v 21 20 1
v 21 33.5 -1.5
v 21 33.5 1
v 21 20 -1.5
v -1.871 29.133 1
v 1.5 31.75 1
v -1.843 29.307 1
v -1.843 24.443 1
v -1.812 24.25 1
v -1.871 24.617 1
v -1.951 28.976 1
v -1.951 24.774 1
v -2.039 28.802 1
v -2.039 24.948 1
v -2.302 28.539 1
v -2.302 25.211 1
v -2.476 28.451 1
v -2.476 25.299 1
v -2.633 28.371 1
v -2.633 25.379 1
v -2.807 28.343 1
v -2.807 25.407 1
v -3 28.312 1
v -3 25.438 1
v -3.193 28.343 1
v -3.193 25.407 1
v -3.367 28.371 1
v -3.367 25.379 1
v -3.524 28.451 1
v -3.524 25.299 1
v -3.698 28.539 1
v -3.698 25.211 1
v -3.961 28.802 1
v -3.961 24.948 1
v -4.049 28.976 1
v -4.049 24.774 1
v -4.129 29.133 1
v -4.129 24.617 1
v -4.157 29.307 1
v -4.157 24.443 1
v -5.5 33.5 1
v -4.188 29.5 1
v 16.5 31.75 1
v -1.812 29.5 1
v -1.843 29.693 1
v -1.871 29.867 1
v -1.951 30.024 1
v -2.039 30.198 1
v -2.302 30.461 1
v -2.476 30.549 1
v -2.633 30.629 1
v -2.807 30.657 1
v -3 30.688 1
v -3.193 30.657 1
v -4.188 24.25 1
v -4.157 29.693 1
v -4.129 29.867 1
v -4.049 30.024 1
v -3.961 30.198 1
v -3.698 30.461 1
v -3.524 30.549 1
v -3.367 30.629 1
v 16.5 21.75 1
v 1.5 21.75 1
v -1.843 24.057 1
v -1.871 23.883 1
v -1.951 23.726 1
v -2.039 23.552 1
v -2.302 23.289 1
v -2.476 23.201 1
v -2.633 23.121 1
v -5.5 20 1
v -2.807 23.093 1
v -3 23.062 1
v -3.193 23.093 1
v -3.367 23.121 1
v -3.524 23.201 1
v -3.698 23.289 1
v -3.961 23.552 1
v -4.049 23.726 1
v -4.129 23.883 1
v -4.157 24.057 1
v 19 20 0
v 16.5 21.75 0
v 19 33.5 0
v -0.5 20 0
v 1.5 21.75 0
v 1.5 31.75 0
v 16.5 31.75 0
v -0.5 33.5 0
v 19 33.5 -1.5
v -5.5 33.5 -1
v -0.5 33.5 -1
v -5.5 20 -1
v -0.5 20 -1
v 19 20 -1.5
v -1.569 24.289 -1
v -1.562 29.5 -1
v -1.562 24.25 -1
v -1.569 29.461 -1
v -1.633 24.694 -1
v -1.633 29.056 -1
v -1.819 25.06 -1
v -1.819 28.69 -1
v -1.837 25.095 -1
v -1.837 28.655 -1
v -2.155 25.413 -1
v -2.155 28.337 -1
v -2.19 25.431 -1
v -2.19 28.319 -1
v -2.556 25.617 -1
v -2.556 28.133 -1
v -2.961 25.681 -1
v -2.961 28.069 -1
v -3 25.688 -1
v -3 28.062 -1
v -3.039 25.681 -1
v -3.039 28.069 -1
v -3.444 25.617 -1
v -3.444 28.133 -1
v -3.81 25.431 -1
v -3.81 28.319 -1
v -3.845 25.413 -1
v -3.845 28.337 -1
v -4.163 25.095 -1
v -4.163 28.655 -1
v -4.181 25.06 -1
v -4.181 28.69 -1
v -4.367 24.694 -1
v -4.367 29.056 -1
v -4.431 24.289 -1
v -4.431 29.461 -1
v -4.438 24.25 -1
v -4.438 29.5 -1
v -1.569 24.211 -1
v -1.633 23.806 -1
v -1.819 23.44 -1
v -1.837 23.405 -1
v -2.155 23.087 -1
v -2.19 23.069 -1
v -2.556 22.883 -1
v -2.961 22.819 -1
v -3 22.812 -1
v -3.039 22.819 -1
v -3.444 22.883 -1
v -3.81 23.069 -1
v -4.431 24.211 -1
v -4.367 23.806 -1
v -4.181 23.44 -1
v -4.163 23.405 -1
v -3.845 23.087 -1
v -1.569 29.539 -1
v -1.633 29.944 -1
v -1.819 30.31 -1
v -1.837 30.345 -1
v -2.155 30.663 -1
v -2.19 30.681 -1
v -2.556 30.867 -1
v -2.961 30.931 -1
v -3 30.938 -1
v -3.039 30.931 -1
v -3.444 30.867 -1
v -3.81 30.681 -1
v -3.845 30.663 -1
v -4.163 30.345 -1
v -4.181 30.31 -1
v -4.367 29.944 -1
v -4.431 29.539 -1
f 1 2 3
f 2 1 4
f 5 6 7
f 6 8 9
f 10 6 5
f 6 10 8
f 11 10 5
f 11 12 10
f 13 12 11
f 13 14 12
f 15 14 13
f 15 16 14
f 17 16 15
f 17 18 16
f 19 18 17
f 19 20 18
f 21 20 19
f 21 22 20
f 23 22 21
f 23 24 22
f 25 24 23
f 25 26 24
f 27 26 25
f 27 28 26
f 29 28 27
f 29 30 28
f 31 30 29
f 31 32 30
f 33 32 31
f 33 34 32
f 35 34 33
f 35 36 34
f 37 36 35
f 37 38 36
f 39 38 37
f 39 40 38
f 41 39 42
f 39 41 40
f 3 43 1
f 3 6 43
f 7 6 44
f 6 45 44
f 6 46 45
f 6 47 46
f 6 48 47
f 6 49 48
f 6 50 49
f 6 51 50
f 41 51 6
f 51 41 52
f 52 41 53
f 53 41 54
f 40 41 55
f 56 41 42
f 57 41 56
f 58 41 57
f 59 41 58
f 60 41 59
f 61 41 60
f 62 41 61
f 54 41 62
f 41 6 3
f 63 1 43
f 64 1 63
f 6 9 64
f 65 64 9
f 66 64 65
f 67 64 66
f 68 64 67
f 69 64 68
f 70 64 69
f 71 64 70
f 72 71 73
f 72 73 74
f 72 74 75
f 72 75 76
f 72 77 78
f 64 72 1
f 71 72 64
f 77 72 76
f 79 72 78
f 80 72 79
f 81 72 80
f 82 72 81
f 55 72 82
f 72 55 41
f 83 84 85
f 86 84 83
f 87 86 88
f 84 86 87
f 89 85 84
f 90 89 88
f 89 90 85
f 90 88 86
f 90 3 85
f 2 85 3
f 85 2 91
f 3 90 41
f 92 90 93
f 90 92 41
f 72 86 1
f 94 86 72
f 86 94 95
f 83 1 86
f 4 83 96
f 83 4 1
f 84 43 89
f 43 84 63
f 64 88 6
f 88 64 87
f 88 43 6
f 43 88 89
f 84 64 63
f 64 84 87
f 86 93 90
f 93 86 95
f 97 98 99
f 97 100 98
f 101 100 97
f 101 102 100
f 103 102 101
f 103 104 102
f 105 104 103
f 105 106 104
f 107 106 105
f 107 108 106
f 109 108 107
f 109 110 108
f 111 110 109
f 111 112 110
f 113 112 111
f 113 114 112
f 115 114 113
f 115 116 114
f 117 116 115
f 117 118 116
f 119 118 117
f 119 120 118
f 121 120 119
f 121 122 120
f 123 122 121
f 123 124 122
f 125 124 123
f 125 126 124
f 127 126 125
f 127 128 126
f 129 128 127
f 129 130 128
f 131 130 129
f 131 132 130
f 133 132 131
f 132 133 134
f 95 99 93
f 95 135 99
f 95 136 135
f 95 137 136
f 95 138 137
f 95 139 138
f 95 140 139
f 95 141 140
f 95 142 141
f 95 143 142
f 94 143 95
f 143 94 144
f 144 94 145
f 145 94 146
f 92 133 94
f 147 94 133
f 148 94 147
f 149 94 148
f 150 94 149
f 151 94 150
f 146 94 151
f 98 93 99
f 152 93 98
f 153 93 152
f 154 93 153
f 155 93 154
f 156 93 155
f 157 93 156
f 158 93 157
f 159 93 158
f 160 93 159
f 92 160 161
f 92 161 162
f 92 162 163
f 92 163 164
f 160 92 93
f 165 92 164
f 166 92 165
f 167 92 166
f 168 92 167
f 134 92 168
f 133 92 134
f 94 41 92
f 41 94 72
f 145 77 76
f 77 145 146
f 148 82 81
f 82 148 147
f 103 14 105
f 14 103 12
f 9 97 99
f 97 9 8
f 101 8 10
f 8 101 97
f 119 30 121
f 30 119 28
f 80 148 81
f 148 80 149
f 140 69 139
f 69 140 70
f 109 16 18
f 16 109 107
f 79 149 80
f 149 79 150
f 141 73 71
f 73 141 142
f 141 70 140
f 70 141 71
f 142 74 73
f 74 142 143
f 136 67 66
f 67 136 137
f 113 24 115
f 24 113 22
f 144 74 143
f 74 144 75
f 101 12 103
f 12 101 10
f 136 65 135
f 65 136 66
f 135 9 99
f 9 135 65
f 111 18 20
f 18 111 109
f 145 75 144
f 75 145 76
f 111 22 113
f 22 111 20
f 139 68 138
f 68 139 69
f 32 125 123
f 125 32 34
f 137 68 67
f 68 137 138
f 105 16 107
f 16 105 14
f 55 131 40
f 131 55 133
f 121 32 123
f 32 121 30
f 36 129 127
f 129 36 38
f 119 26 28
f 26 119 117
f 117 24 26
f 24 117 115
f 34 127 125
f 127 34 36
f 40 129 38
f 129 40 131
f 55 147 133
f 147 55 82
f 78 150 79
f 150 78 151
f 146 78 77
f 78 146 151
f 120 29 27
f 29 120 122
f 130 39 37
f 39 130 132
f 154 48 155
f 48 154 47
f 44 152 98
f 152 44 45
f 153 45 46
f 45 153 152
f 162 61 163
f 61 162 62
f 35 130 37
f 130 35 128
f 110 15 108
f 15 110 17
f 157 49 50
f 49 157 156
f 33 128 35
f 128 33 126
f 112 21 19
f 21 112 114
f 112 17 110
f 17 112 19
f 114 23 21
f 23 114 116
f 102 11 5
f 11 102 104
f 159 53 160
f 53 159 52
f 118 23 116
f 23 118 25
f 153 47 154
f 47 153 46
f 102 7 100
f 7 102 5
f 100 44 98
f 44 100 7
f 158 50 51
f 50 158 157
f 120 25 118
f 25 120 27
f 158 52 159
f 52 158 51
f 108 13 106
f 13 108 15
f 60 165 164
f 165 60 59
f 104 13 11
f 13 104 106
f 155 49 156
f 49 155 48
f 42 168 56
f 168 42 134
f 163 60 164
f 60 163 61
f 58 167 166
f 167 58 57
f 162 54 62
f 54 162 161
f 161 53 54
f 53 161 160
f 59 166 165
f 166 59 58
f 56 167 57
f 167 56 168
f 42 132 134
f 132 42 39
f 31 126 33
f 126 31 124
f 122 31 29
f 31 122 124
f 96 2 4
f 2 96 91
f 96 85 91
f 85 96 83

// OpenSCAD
translate([0,20,0])
union() {
    difference() {
        translate([-1,0,0]) cube([22,13.5,1]);
        translate([1.5,1.75,-0.5]) cube([15,10,2]);
    }

    translate([-5.5,0,0]) 
    union() {
        difference() {
            translate([0,0,-1]) cube([5,13.5,2]);
            translate([2.5,4.25,0.5]) cylinder(h = 4, r1 = 1.5, r2 = 1, 
                $fn = 20, center = true);
            translate([2.5,9.5,0.5]) cylinder(h = 4, r1 = 1.5, r2 = 1, 
                $fn = 20, center = true);
        }
    }
    
    translate([19,0,-1.5])
    cube([2,13.5,1.5]);
}
